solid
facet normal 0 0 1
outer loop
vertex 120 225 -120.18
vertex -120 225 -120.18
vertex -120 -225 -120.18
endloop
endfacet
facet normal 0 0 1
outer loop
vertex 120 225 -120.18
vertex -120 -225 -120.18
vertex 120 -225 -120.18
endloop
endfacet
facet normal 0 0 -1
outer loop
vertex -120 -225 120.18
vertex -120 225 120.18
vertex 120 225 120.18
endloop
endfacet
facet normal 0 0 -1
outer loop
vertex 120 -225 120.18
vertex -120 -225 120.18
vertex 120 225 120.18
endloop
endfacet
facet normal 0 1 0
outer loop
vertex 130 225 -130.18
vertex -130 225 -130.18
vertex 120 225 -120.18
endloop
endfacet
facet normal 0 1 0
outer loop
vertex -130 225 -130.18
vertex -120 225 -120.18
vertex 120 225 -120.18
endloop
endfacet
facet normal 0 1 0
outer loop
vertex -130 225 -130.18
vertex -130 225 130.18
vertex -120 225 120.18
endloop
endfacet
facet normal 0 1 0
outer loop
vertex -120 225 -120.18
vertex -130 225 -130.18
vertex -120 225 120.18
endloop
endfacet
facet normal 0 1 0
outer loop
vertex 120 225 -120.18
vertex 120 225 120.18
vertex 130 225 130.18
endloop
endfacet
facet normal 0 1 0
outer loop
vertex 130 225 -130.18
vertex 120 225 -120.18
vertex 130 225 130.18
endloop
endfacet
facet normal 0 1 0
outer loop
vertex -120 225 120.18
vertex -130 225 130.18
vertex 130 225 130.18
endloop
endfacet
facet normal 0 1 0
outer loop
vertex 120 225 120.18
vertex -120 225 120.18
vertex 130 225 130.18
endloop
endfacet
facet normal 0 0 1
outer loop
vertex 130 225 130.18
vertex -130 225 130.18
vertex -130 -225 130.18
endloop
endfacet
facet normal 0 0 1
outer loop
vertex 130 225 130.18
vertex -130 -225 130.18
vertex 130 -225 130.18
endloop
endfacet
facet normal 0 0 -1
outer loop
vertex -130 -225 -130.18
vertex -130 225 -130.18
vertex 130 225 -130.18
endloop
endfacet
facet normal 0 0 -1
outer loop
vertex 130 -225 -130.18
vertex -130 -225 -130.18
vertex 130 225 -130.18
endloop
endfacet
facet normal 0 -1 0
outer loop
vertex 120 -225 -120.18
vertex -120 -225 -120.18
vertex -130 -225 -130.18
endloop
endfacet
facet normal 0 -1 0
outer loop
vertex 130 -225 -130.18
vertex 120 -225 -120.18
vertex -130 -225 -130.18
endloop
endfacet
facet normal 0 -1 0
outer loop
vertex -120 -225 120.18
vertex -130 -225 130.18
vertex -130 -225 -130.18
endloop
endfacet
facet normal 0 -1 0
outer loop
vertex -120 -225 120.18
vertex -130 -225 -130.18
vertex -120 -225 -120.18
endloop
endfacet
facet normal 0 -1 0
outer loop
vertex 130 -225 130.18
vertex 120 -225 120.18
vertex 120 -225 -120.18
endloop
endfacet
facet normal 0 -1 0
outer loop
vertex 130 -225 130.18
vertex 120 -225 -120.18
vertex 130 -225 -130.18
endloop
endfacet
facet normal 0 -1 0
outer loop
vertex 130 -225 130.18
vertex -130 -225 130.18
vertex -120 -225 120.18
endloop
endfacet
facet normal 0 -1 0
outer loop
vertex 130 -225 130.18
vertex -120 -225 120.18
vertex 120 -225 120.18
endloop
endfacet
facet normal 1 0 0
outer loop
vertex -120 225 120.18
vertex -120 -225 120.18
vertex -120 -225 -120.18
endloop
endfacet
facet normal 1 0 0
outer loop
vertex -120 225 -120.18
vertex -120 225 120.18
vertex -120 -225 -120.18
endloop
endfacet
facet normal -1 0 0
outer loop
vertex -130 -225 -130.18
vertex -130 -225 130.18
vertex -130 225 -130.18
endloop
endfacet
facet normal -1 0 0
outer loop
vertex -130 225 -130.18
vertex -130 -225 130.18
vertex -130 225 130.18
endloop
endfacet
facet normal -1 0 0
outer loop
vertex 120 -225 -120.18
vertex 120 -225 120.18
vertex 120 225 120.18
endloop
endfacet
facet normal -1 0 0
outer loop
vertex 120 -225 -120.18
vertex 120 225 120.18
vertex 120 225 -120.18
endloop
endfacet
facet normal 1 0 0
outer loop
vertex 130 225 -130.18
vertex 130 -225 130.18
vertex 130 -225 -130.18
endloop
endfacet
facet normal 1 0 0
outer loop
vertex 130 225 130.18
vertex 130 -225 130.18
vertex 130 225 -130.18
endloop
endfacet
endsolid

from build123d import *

# Parameters (mm, degrees)
ESQUISSE1_W             = 260
ESQUISSE1_H             = 450
BOSS_EXTRU_1_DEPTH      = 130.18
ENL_V_MAT_EXTRU_1_REACH = 488.155
ESQUISSE2_W             = 240
ESQUISSE2_H             = 240.36


with BuildPart() as part:
    # Esquisse1 → Boss.-Extru.1 (new, symmetric)
    with BuildSketch(Plane.XY):
        Rectangle(ESQUISSE1_W, ESQUISSE1_H)
    extrude(amount=BOSS_EXTRU_1_DEPTH, both=True)

    # Esquisse2 → Enlèv. mat.-Extru.1 (cut, up to next)
    with BuildSketch(Plane(origin=(0, 225, 0), x_dir=(1, 0, 0), z_dir=(0, 1, 0)), mode=Mode.PRIVATE) as enl_v_mat_extru_1_sk1:
        Rectangle(ESQUISSE2_W, ESQUISSE2_H)
    enl_v_mat_extru_1_tool1 = extrude(enl_v_mat_extru_1_sk1.sketch, amount=-ENL_V_MAT_EXTRU_1_REACH, mode=Mode.PRIVATE) & part.part
    add(enl_v_mat_extru_1_tool1.solids().sort_by_distance((0, 225, 0))[0], mode=Mode.SUBTRACT)


solid = part.part
